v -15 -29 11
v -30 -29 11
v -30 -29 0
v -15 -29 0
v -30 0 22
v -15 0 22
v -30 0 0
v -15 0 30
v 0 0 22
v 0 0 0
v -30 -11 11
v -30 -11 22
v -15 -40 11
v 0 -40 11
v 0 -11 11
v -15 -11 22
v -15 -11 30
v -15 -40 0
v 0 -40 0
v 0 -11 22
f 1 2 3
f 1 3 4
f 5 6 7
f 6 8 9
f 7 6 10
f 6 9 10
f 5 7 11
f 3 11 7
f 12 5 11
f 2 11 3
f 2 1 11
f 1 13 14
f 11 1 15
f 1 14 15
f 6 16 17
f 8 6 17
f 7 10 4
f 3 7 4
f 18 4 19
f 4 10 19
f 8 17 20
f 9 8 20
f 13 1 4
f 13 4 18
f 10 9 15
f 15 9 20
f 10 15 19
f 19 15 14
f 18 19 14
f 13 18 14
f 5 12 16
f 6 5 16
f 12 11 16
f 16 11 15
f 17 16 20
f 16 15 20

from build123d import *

# Parameters (mm, degrees)
F1_DEPTH = 30
F2_W     = 11
F2_H     = 15
F3_DEPTH = 11
F4_W     = 15
F4_H     = 8
F5_DEPTH = 11
F6_ANGLE = -90
F8_DEPTH = 11.001


with BuildPart() as f1:
    # F0 (on Front) → F1 (new body)
    with BuildSketch(Plane.XZ):
        Polygon((0, 30), (0, 0), (40, 0), (40, 11), (11, 11), (11, 30), align=None)
    extrude(amount=F1_DEPTH)

    # F2 (on face) → F3 (cut, through all)
    with BuildSketch(Plane.XY.offset(11)):
        with Locations((34.5, -22.5)):
            Rectangle(F2_W, F2_H)
    extrude(amount=-F3_DEPTH, mode=Mode.SUBTRACT)

    # F4 (on face) → F5 (cut, through all)
    with BuildSketch(Plane.YZ.offset(11)):
        with Locations((-22.5, 26)):
            Rectangle(F4_W, F4_H)
    extrude(amount=-F5_DEPTH, mode=Mode.SUBTRACT)


with BuildPart() as f1_1:
    # F6: moved
    add(f1.part.rotate(Axis((0, 0, 15), (0, 0, 1)), F6_ANGLE))

    # F7 (on face) → F8 (cut, through all)
    with BuildSketch(Plane.XZ.offset(11)):
        Polygon((0, 30), (-15, 30), (-7.5, 26), align=None)
        Polygon((0, 30), (-7.5, 26), (0, 22), align=None)
    extrude(amount=-F8_DEPTH, mode=Mode.SUBTRACT)


solid = f1_1.part
